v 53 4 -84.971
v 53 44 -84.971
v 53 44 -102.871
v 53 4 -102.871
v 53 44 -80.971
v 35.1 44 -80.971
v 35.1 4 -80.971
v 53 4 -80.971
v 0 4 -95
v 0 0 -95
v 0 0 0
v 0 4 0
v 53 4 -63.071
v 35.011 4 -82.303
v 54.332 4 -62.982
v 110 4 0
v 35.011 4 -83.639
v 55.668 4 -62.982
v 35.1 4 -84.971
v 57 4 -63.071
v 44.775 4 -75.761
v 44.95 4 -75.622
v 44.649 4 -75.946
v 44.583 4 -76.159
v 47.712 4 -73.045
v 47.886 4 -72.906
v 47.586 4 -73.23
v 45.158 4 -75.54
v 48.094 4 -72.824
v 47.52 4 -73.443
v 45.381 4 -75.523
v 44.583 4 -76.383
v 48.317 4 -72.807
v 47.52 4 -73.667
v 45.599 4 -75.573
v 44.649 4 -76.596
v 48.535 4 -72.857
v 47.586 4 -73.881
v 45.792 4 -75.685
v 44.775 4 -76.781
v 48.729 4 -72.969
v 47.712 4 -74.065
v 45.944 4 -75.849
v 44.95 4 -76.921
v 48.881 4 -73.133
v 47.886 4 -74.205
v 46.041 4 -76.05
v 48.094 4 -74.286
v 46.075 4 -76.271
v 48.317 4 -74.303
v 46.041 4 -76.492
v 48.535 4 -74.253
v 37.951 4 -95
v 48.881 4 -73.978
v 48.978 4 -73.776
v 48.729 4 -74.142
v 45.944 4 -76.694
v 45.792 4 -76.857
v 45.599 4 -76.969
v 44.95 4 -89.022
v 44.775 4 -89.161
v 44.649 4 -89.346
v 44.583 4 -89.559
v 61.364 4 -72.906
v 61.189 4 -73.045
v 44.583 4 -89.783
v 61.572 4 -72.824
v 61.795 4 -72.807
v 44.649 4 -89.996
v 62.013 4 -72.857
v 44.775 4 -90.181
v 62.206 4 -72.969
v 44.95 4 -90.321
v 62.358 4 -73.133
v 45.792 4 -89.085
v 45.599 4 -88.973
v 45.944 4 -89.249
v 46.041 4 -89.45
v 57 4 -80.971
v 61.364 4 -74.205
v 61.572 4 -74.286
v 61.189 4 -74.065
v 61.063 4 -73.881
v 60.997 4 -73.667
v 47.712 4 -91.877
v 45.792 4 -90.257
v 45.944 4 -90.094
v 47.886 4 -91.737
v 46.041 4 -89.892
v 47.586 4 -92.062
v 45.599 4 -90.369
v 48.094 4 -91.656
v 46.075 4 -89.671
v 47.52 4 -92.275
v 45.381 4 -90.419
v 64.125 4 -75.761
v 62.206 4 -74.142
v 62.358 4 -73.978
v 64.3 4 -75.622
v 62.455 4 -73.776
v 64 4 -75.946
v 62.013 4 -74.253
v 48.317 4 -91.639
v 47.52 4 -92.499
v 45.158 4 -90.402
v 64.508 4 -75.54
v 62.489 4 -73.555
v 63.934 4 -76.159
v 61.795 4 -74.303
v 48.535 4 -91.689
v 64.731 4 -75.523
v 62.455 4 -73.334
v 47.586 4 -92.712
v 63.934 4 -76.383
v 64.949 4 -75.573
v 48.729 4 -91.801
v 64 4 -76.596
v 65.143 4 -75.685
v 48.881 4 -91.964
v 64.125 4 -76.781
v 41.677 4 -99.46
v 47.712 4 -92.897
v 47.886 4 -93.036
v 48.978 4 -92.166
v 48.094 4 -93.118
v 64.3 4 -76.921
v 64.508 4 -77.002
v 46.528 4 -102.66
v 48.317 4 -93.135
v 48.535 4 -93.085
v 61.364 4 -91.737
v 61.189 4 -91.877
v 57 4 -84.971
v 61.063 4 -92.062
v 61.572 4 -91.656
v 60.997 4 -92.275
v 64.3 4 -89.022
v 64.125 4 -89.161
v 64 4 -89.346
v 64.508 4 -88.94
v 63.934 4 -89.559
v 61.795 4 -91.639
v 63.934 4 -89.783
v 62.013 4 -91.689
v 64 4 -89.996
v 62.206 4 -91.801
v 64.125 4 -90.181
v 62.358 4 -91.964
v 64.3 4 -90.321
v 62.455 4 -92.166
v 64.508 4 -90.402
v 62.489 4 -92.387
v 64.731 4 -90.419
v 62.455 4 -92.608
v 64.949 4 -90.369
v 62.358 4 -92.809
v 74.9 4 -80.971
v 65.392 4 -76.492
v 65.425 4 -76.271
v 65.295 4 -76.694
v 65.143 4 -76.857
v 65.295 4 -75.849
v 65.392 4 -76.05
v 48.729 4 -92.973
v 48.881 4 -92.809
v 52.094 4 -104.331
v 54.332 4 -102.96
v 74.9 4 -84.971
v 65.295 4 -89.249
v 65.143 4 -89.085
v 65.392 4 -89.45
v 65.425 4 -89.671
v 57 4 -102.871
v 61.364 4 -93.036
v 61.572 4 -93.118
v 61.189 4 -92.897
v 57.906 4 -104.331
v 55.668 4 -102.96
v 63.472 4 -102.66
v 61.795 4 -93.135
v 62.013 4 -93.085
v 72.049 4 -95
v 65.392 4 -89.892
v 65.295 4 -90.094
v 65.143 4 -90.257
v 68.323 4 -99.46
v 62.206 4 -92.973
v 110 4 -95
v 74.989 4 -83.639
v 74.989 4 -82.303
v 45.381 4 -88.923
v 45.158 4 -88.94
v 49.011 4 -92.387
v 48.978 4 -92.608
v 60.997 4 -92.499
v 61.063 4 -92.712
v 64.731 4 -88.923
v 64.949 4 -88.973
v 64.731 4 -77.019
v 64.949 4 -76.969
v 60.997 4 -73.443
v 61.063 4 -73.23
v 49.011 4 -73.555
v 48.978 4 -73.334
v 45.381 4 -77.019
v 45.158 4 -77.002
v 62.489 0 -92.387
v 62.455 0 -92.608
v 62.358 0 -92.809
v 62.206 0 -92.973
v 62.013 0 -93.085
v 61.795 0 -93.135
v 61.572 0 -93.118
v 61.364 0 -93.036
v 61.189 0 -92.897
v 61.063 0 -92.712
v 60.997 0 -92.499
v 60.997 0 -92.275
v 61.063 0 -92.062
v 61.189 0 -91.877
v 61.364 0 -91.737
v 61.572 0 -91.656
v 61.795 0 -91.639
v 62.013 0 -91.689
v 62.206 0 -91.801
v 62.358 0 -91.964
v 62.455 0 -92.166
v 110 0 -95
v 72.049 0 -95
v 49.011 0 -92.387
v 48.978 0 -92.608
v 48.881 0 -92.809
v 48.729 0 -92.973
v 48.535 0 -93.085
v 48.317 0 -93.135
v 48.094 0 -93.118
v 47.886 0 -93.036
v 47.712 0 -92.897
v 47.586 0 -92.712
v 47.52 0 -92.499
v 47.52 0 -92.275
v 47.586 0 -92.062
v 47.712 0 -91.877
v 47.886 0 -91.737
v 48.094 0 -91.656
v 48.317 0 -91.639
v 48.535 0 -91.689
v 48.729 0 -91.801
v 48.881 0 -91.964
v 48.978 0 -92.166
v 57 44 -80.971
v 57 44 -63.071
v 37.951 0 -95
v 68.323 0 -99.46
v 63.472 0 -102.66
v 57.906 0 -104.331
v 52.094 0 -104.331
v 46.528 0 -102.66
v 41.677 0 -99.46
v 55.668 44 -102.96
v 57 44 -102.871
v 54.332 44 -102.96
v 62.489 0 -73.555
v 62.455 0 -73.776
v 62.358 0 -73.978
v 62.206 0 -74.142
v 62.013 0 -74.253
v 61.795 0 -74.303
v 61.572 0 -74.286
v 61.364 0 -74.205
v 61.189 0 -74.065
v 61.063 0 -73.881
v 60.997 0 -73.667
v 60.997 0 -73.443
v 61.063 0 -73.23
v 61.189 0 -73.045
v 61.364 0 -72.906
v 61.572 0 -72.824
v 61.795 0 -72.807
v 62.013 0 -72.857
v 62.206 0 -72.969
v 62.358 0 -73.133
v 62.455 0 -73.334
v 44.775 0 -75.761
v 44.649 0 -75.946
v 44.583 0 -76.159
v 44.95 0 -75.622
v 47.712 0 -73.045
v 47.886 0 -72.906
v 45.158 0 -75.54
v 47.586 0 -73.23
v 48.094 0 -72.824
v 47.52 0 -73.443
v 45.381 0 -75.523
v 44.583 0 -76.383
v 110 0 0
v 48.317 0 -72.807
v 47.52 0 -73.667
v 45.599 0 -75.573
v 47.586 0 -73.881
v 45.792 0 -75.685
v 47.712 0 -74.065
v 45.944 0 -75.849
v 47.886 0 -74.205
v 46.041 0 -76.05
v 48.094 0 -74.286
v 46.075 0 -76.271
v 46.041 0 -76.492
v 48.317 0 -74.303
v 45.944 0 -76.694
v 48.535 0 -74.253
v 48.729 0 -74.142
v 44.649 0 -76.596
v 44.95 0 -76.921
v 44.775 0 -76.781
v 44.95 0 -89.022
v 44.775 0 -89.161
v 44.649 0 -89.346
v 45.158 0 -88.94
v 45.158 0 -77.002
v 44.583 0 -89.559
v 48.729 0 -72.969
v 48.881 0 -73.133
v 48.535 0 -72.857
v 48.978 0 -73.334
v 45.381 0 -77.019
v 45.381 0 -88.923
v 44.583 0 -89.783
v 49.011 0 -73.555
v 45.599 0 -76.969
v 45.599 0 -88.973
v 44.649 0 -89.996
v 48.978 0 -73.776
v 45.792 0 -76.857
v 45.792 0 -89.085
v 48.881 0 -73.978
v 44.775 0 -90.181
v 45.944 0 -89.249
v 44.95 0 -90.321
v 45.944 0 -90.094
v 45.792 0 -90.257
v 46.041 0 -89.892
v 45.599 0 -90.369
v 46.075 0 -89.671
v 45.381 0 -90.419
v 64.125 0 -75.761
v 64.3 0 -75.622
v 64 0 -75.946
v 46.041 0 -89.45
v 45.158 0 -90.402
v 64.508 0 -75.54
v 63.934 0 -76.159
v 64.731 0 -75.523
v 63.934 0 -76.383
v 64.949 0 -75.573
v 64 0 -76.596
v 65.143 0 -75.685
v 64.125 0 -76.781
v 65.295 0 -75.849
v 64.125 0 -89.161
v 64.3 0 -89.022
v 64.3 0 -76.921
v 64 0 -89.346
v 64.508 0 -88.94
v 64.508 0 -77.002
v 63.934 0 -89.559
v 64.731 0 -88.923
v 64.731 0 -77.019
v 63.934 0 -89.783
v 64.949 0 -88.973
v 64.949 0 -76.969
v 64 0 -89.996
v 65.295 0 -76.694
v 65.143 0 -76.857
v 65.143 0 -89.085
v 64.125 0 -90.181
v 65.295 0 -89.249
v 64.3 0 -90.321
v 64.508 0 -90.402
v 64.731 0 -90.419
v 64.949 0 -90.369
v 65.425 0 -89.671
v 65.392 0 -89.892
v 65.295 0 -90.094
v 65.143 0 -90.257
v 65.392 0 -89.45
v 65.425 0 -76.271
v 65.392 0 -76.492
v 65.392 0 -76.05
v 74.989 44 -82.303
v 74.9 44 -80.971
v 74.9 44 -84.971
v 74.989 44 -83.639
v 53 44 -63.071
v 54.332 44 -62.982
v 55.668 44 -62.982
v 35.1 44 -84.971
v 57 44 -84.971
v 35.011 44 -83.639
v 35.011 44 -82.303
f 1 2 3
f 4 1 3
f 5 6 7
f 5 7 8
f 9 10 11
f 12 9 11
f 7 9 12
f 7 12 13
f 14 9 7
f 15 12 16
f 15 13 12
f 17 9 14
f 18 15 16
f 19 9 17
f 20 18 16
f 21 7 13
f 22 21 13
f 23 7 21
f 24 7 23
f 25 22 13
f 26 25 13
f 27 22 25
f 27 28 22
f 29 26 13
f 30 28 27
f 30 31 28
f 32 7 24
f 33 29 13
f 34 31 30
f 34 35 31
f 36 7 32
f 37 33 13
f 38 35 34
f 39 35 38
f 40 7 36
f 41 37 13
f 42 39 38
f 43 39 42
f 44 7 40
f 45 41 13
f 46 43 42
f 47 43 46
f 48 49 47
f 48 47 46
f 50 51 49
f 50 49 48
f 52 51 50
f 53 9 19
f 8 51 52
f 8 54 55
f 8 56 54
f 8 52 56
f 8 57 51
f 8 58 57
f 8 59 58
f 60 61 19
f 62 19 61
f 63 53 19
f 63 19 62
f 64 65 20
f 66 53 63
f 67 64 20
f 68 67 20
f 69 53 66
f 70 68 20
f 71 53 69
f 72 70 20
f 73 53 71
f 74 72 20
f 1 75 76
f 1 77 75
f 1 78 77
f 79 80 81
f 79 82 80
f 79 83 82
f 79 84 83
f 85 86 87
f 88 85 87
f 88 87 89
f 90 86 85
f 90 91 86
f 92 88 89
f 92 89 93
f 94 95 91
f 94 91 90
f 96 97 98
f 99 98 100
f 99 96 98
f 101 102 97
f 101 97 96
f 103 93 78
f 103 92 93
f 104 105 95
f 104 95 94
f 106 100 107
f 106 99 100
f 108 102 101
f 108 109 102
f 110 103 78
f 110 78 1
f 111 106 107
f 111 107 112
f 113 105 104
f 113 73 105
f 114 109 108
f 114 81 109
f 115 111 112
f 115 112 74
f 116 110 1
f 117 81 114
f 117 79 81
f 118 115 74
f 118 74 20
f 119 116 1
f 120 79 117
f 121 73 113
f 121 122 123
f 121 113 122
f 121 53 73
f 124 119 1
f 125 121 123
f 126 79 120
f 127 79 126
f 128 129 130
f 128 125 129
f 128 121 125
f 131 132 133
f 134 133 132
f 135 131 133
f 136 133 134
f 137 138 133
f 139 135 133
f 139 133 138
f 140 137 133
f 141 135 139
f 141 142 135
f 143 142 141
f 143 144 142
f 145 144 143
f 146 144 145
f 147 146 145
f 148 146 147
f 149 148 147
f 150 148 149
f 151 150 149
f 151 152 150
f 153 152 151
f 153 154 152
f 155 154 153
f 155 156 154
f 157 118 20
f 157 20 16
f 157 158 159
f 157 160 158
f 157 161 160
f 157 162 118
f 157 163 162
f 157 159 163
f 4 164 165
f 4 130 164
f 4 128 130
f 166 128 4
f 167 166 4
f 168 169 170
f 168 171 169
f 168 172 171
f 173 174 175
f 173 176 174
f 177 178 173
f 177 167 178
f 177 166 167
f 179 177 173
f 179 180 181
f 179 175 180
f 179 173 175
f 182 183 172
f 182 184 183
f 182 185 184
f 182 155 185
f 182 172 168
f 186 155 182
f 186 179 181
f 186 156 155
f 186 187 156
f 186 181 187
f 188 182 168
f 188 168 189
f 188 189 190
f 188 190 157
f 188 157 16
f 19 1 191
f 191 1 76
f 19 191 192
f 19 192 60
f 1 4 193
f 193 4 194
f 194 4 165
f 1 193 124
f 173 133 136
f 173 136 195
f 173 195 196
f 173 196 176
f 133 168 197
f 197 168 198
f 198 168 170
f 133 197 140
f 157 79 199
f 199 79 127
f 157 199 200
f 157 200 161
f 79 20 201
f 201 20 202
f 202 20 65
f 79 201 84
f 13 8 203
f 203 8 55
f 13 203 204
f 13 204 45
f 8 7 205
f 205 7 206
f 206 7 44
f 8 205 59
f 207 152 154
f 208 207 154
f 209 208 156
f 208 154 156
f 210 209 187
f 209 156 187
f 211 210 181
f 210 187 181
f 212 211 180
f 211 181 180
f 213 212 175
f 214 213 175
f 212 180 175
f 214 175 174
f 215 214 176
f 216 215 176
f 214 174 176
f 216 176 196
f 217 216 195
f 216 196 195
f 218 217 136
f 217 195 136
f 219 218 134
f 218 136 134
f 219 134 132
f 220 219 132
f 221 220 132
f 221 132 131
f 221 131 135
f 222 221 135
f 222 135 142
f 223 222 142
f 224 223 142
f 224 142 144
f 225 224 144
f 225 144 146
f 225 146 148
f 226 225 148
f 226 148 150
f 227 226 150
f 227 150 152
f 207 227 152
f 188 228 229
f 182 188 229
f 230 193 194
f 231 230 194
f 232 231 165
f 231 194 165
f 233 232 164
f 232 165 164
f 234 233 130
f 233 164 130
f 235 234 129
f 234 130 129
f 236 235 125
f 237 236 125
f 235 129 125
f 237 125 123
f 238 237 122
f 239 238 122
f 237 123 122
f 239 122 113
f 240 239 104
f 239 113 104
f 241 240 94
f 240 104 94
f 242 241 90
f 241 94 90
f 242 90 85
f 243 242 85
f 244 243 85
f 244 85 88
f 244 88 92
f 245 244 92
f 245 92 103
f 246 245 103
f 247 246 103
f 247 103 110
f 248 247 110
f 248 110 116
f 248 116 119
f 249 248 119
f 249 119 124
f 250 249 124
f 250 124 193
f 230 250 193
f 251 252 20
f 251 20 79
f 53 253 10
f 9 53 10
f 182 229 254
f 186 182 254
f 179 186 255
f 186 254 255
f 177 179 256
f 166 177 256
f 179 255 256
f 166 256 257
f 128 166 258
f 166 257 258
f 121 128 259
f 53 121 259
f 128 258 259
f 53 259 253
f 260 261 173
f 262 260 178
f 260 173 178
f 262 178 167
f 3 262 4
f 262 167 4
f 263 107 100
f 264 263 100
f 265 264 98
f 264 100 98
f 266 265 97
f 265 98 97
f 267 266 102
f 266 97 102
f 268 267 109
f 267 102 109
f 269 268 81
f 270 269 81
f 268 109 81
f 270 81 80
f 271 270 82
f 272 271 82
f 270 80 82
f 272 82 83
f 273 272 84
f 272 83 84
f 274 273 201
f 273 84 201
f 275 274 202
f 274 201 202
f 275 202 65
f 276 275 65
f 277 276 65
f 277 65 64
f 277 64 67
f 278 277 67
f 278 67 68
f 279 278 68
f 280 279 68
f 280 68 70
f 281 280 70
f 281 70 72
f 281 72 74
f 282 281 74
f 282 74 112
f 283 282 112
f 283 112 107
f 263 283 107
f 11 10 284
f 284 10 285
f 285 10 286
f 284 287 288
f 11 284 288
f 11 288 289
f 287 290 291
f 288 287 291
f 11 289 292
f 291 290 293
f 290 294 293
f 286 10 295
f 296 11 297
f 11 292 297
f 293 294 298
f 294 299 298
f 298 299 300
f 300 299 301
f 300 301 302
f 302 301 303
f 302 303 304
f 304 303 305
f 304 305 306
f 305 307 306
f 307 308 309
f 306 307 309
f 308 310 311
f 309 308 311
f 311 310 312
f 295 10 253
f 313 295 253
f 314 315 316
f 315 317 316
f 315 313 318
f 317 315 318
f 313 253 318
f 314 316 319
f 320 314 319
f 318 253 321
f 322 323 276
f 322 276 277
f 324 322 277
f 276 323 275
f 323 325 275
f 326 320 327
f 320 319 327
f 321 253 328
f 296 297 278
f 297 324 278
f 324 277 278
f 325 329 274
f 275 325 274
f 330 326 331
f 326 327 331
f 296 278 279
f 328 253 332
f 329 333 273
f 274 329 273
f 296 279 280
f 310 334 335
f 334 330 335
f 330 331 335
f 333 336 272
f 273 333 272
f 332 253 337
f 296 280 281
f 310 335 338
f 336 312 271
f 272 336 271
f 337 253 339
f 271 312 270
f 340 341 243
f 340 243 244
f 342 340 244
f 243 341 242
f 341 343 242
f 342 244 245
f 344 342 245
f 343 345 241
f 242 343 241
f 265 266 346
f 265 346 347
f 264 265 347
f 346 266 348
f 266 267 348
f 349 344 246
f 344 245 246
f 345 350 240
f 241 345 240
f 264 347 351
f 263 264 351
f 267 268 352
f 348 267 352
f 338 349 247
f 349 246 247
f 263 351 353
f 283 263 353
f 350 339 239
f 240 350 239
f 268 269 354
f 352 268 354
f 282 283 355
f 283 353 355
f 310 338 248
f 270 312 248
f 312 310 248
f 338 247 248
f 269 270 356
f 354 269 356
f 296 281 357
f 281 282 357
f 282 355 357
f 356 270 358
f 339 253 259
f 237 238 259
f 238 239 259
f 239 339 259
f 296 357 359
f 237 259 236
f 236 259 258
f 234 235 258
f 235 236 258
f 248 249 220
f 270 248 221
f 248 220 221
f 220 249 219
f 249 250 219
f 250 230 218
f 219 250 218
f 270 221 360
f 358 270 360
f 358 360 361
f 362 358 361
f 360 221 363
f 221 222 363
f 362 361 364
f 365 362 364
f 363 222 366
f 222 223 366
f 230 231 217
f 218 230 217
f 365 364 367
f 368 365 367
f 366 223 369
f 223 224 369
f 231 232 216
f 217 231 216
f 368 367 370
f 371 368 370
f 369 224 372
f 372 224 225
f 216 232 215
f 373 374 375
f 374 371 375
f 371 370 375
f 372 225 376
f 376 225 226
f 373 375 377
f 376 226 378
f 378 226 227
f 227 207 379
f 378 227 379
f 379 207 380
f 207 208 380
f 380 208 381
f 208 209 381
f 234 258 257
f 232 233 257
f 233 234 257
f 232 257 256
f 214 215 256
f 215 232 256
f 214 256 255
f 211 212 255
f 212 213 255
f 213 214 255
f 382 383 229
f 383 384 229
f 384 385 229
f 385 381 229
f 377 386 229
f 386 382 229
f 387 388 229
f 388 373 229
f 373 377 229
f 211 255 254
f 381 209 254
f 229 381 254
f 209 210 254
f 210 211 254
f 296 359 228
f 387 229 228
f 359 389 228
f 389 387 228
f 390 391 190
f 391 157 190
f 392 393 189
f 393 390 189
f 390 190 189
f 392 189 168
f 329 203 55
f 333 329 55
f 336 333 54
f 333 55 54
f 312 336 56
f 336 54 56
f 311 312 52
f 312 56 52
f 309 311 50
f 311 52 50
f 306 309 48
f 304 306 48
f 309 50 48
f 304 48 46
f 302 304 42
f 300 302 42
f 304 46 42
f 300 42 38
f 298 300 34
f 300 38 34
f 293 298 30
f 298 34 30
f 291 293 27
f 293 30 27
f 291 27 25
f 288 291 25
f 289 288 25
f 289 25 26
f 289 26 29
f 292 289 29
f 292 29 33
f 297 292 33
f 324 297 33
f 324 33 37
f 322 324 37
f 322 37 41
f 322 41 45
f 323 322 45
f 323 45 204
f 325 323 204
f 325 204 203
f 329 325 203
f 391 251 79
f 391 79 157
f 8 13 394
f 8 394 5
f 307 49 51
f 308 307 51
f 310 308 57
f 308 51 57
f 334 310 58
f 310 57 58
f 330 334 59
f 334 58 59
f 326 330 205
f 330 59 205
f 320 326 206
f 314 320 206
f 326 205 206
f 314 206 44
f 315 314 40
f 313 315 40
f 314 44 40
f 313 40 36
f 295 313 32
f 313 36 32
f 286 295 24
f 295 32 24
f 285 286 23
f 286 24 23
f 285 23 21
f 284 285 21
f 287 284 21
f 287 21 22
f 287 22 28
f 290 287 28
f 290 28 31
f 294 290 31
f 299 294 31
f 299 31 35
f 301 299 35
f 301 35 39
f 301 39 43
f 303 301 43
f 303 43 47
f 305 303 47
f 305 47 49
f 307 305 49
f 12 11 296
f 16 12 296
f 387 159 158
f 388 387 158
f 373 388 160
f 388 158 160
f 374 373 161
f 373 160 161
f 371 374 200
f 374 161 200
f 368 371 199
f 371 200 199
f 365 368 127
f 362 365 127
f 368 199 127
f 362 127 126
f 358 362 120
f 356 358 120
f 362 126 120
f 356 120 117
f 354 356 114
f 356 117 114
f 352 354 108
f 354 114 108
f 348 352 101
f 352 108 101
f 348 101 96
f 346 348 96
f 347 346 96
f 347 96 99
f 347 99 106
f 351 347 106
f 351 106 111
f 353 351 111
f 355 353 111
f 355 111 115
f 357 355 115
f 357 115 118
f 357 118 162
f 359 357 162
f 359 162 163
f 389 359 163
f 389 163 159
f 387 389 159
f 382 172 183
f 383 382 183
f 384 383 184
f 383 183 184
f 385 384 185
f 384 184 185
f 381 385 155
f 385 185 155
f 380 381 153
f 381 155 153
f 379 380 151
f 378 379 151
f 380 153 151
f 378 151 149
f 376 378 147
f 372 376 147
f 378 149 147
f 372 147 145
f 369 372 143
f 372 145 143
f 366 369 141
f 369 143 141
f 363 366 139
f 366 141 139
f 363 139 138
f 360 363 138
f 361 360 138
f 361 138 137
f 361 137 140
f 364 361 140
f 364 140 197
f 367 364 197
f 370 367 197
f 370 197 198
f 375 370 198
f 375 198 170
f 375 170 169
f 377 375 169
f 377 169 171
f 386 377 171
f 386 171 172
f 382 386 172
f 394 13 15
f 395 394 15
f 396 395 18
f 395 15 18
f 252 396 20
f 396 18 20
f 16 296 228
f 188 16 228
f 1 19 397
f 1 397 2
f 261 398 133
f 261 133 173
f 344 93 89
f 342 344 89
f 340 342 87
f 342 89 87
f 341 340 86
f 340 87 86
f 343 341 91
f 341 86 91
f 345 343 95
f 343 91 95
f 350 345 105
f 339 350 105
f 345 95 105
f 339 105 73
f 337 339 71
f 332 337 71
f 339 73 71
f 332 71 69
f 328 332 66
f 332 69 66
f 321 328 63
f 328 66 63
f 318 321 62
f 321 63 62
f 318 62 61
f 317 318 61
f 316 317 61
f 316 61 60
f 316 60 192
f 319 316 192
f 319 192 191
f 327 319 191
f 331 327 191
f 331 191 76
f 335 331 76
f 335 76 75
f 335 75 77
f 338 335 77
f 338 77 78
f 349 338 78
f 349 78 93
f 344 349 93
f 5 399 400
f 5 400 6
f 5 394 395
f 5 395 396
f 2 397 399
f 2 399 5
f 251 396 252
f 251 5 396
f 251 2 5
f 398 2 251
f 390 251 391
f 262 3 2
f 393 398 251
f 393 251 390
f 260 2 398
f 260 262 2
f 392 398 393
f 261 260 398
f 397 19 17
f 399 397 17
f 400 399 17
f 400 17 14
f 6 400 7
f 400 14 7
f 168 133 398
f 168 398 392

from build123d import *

# Parameters (mm, degrees)
BOSS_EXTRUDE4_DEPTH = 4
SKETCH3_R           = 20
BOSS_EXTRUDE5_DEPTH = 40
SKETCH4_W           = 38.356352869
SKETCH4_H           = 36.352662793
SKETCH4_W_2         = 41.648129421
SKETCH4_H_2         = 27.192936736
SKETCH4_W_3         = 57.677650023
SKETCH4_H_3         = 26.910385372
SKETCH4_W_4         = 38.070111429
SKETCH4_H_4         = 39.361887981
CUT_EXTRUDE5_DEPTH  = 40
SKETCH7_R           = 0.75
CUT_EXTRUDE6_DEPTH  = 5


with BuildPart() as part:
    # Sketch2 → Boss-Extrude4 (new body)
    with BuildSketch(Plane(origin=(0, 0, 0), x_dir=(1, 0, 0), z_dir=(0, 1, 0))):
        with BuildLine():
            Line((0, 95), (0, 0))
            Line((0, 0), (110, 0))
            Line((110, 0), (110, 95))
            Line((110, 95), (72.04868569, 95))
            ThreePointArc((72.04868569, 95), (55, 104.543312367), (37.95131431, 95))
            Line((37.95131431, 95), (0, 95))
        make_face()
    extrude(amount=BOSS_EXTRUDE4_DEPTH)

    # Sketch3 → Boss-Extrude5 (add)
    with BuildSketch(Plane(origin=(0, 4, 0), x_dir=(1, 0, 0), z_dir=(0, 1, 0))):
        with Locations((55, 82.97105055)):
            Circle(SKETCH3_R)
    extrude(amount=BOSS_EXTRUDE5_DEPTH)

    # Sketch4 → Cut-Extrude5 (cut)
    with BuildSketch(Plane(origin=(0, 44, 0), x_dir=(1, 0, 0), z_dir=(0, 1, 0))):
        with Locations((33.821823565, 62.794719153)):
            Rectangle(SKETCH4_W, SKETCH4_H)
        with Locations((32.17593529, 98.567518918)):
            Rectangle(SKETCH4_W_2, SKETCH4_H_2)
        with Locations((85.838825012, 98.426243236)):
            Rectangle(SKETCH4_W_3, SKETCH4_H_3)
        with Locations((76.035055715, 61.29010656)):
            Rectangle(SKETCH4_W_4, SKETCH4_H_4)
    extrude(amount=-CUT_EXTRUDE5_DEPTH, mode=Mode.SUBTRACT)

    # Sketch7 → Cut-Extrude6 (cut, through all)
    with BuildSketch(Plane(origin=(0, 4, 0), x_dir=(1, 0, 0), z_dir=(0, 1, 0))):
        with Locations((45.324714989, 89.67105055)):
            Circle(SKETCH7_R)
        with Locations((48.261379546, 92.386930017)):
            Circle(SKETCH7_R)
        with Locations((61.738620454, 92.386930017)):
            Circle(SKETCH7_R)
        with Locations((64.675285011, 89.67105055)):
            Circle(SKETCH7_R)
        with Locations((64.675285011, 76.27105055)):
            Circle(SKETCH7_R)
        with Locations((61.738620454, 73.555171083)):
            Circle(SKETCH7_R)
        with Locations((48.261379546, 73.555171083)):
            Circle(SKETCH7_R)
        with Locations((45.324714989, 76.27105055)):
            Circle(SKETCH7_R)
    extrude(amount=-CUT_EXTRUDE6_DEPTH, mode=Mode.SUBTRACT)


solid = part.part
